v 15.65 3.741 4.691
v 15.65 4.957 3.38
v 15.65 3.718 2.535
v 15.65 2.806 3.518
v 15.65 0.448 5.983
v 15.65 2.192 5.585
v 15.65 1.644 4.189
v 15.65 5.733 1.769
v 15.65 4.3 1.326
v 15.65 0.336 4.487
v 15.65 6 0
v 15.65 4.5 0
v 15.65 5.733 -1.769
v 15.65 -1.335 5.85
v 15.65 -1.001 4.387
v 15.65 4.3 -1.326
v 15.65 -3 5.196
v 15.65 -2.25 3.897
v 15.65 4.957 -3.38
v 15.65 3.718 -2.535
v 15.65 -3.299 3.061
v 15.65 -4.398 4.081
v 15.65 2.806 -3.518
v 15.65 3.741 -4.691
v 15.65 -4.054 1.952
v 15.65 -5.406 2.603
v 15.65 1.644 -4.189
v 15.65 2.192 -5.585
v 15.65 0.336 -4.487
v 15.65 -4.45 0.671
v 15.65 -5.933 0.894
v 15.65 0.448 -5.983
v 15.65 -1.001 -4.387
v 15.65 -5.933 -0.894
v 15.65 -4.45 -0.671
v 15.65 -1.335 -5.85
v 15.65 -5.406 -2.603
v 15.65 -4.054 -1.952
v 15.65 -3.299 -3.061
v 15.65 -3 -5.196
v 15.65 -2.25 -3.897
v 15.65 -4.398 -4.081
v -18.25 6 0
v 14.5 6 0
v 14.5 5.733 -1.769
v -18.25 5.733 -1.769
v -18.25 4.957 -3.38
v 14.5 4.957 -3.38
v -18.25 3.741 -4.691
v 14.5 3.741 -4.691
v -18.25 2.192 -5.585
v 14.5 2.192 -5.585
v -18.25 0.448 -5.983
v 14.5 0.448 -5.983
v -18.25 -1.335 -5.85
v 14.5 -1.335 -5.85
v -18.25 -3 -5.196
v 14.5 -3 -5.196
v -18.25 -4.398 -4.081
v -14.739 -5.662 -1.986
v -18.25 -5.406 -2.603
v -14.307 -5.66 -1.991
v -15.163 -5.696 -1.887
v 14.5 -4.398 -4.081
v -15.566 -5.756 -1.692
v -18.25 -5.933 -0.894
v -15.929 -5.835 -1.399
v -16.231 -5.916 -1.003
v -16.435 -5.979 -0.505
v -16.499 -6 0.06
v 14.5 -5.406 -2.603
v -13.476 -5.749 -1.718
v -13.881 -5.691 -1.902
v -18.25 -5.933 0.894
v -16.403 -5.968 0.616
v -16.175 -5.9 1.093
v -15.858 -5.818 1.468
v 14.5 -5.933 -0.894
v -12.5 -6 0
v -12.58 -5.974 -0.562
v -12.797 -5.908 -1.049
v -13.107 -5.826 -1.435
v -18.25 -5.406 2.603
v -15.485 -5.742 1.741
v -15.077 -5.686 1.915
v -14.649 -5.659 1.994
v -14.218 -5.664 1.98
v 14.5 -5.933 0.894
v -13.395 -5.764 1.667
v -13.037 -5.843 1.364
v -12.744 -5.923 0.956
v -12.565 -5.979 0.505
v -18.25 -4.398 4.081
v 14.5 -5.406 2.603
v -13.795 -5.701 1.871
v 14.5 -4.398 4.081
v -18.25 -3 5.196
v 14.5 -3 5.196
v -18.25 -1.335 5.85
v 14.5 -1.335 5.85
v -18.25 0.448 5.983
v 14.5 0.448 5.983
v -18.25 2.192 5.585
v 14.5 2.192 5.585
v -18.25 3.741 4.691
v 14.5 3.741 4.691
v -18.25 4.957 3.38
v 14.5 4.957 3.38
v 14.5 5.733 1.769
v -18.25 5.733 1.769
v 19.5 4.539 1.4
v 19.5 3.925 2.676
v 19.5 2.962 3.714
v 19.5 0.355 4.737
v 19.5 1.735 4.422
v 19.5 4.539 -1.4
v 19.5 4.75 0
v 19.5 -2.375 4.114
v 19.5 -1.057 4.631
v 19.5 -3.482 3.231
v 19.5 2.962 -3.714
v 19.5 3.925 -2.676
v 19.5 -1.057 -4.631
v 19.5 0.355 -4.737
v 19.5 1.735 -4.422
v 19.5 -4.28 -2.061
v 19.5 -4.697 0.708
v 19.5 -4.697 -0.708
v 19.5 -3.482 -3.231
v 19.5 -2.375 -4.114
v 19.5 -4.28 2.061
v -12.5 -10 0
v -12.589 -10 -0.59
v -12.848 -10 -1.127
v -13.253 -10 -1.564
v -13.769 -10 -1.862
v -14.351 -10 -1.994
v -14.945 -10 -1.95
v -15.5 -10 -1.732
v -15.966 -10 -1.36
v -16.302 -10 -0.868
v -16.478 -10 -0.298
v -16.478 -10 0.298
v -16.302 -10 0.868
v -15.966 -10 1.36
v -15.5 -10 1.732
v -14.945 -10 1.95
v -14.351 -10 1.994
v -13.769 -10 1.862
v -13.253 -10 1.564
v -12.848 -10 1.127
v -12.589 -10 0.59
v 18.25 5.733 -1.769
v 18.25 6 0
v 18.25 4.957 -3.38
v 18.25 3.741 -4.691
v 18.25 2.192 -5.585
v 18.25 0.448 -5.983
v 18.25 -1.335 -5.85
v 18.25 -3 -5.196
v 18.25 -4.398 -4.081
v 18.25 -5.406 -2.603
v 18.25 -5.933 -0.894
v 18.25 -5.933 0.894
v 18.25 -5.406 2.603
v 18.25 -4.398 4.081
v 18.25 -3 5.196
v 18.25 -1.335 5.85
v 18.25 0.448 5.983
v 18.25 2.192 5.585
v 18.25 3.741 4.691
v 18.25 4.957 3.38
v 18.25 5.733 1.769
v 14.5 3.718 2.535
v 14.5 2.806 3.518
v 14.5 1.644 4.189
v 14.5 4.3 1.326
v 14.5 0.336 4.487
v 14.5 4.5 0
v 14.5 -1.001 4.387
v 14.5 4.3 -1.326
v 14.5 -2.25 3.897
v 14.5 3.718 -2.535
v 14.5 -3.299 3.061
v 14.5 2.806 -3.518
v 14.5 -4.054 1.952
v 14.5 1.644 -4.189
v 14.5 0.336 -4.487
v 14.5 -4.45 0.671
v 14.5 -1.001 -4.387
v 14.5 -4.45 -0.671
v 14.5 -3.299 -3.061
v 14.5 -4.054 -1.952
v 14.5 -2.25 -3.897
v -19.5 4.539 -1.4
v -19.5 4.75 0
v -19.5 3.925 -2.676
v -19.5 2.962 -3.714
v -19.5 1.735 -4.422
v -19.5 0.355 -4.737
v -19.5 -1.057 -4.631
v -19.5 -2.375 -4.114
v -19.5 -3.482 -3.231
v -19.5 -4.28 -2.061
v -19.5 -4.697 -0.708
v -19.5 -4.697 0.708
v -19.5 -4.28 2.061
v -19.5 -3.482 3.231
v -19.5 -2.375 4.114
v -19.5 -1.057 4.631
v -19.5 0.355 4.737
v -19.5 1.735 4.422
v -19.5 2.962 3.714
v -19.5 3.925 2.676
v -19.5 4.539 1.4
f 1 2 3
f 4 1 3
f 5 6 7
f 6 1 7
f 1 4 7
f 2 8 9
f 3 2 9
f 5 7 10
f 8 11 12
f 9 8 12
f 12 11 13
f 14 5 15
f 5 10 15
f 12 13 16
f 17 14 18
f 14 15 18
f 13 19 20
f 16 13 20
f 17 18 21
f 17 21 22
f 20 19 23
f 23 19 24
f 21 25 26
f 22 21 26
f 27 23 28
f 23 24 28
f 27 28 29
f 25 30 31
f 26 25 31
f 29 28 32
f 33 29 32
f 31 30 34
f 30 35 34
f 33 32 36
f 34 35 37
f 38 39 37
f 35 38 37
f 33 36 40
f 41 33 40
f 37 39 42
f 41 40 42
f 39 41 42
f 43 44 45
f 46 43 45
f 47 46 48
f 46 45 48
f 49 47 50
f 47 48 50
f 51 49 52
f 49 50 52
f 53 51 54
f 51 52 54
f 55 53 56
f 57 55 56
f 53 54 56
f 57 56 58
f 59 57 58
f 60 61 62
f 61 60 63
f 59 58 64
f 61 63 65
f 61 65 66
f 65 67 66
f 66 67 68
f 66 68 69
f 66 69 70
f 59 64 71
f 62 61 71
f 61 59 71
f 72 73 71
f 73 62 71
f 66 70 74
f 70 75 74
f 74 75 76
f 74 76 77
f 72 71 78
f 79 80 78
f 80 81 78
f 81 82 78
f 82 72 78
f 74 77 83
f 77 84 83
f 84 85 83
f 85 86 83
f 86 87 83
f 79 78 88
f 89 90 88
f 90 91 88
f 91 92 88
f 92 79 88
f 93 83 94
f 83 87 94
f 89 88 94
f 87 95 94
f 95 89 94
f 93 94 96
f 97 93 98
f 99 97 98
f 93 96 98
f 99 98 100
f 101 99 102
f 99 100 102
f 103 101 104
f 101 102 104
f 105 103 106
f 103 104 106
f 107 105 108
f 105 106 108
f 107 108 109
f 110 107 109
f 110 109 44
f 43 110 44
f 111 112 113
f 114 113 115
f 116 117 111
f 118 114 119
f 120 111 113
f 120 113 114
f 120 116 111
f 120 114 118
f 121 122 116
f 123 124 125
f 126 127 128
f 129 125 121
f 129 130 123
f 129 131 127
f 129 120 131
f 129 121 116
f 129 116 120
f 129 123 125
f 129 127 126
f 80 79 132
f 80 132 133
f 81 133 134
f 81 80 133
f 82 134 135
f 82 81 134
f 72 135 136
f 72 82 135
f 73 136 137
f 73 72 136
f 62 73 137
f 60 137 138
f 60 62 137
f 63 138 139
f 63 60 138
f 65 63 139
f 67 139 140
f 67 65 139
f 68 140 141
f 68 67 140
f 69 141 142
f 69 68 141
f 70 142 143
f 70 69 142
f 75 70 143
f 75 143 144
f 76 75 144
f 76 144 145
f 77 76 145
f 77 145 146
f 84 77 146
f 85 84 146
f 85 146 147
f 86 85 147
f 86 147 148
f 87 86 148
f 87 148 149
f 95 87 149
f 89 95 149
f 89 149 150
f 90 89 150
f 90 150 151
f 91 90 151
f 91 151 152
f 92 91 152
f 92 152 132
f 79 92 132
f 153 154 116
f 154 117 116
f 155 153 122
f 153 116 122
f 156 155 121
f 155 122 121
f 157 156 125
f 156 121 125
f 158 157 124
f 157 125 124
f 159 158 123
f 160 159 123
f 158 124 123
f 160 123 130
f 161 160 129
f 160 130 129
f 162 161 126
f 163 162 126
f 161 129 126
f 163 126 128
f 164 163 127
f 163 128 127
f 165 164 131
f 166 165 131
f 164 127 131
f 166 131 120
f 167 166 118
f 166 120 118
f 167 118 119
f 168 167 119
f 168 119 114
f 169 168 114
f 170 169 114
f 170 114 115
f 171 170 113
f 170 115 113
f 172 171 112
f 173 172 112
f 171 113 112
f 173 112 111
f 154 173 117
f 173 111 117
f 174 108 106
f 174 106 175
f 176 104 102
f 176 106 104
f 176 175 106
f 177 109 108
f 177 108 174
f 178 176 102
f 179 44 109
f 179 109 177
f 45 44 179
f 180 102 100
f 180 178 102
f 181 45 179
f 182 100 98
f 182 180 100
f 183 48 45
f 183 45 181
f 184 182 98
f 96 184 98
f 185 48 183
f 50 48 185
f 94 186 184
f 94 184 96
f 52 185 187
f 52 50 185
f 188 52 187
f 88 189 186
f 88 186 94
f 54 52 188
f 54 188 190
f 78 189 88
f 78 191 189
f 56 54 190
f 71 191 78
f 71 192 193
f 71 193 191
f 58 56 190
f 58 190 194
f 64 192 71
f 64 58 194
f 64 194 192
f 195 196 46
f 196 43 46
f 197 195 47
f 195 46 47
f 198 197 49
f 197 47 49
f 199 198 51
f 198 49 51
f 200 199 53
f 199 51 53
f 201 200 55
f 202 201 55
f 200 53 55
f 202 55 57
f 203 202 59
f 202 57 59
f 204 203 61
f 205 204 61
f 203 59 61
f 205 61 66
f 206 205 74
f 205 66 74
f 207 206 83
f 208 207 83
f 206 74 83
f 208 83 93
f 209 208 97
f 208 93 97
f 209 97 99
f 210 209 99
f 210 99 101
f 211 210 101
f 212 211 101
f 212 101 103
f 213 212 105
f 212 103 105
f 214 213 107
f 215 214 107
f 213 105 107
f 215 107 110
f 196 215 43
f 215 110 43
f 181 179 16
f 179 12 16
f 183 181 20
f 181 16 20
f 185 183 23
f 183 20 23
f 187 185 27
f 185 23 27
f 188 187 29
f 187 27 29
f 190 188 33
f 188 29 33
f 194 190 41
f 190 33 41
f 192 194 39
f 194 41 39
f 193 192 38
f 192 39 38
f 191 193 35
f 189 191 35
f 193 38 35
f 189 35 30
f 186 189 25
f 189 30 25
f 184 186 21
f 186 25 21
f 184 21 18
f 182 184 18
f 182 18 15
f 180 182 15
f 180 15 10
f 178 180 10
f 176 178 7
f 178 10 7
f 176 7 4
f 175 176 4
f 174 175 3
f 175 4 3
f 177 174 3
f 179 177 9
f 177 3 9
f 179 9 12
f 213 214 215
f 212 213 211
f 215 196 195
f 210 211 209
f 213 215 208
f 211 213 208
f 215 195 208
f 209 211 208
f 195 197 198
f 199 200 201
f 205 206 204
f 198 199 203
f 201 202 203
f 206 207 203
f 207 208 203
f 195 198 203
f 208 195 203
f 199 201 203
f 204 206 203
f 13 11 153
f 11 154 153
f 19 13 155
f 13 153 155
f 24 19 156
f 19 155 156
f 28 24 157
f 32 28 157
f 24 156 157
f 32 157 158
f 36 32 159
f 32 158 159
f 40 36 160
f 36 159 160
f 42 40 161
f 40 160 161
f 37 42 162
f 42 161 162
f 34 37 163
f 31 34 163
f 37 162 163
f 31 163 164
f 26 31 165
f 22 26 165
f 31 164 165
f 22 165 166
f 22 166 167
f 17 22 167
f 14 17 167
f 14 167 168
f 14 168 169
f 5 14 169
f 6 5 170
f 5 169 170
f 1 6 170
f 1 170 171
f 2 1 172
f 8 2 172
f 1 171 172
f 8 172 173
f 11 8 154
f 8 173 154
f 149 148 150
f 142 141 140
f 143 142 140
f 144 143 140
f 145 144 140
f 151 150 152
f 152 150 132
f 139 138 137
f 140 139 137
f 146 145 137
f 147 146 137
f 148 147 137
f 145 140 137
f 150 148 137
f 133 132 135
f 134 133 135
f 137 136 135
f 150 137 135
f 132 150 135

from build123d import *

# Parameters (mm, degrees)
SKETCH1_W           = 34
SKETCH1_H           = 6
SKETCH3_R           = 2
BOSS_EXTRUDE1_DEPTH = 10
SKETCH4_W           = 5
SKETCH4_H           = 6
SKETCH5_W           = 1.15
SKETCH5_H           = 1.5


with BuildPart() as part:
    # Sketch1 → Revolve1 (revolve)
    with BuildSketch(Plane.XY):
        with Locations((-2.5, 3)):
            Rectangle(SKETCH1_W, SKETCH1_H)
    revolve(axis=Axis((14.5, 0, 0), (-1, 0, 0)))

    # Sketch2 → Cut-Revolve1 (revolve, cut)
    with BuildSketch(Plane.XY):
        Polygon((-19.5, 4.75), (-18.25, 6), (-19.5, 6), align=None)
    revolve(axis=Axis((29, 0, 0), (-1, 0, 0)), mode=Mode.SUBTRACT)

    # Sketch3 → Boss-Extrude1 (add)
    with BuildSketch(Plane(origin=(0, 0, 0), x_dir=(1, 0, 0), z_dir=(0, 1, 0))):
        with Locations((-14.5, 0)):
            Circle(SKETCH3_R)
    extrude(amount=-BOSS_EXTRUDE1_DEPTH)

    # Sketch4 → Revolve2 (revolve)
    with BuildSketch(Plane.XY):
        with Locations((17, 3)):
            Rectangle(SKETCH4_W, SKETCH4_H)
    revolve(axis=Axis((19.5, 0, 0), (-1, 0, 0)))

    # Sketch5 → Cut-Revolve2 (revolve, cut)
    with BuildSketch(Plane.XY):
        with Locations((15.075, 5.25)):
            Rectangle(SKETCH5_W, SKETCH5_H)
    revolve(axis=Axis((29, 0, 0), (-1, 0, 0)), mode=Mode.SUBTRACT)

    # Sketch6 → Cut-Revolve3 (revolve, cut)
    with BuildSketch(Plane.XY):
        Polygon((18.25, 6), (19.5, 4.75), (19.5, 6), align=None)
    revolve(axis=Axis((29, 0, 0), (-1, 0, 0)), mode=Mode.SUBTRACT)


solid = part.part
